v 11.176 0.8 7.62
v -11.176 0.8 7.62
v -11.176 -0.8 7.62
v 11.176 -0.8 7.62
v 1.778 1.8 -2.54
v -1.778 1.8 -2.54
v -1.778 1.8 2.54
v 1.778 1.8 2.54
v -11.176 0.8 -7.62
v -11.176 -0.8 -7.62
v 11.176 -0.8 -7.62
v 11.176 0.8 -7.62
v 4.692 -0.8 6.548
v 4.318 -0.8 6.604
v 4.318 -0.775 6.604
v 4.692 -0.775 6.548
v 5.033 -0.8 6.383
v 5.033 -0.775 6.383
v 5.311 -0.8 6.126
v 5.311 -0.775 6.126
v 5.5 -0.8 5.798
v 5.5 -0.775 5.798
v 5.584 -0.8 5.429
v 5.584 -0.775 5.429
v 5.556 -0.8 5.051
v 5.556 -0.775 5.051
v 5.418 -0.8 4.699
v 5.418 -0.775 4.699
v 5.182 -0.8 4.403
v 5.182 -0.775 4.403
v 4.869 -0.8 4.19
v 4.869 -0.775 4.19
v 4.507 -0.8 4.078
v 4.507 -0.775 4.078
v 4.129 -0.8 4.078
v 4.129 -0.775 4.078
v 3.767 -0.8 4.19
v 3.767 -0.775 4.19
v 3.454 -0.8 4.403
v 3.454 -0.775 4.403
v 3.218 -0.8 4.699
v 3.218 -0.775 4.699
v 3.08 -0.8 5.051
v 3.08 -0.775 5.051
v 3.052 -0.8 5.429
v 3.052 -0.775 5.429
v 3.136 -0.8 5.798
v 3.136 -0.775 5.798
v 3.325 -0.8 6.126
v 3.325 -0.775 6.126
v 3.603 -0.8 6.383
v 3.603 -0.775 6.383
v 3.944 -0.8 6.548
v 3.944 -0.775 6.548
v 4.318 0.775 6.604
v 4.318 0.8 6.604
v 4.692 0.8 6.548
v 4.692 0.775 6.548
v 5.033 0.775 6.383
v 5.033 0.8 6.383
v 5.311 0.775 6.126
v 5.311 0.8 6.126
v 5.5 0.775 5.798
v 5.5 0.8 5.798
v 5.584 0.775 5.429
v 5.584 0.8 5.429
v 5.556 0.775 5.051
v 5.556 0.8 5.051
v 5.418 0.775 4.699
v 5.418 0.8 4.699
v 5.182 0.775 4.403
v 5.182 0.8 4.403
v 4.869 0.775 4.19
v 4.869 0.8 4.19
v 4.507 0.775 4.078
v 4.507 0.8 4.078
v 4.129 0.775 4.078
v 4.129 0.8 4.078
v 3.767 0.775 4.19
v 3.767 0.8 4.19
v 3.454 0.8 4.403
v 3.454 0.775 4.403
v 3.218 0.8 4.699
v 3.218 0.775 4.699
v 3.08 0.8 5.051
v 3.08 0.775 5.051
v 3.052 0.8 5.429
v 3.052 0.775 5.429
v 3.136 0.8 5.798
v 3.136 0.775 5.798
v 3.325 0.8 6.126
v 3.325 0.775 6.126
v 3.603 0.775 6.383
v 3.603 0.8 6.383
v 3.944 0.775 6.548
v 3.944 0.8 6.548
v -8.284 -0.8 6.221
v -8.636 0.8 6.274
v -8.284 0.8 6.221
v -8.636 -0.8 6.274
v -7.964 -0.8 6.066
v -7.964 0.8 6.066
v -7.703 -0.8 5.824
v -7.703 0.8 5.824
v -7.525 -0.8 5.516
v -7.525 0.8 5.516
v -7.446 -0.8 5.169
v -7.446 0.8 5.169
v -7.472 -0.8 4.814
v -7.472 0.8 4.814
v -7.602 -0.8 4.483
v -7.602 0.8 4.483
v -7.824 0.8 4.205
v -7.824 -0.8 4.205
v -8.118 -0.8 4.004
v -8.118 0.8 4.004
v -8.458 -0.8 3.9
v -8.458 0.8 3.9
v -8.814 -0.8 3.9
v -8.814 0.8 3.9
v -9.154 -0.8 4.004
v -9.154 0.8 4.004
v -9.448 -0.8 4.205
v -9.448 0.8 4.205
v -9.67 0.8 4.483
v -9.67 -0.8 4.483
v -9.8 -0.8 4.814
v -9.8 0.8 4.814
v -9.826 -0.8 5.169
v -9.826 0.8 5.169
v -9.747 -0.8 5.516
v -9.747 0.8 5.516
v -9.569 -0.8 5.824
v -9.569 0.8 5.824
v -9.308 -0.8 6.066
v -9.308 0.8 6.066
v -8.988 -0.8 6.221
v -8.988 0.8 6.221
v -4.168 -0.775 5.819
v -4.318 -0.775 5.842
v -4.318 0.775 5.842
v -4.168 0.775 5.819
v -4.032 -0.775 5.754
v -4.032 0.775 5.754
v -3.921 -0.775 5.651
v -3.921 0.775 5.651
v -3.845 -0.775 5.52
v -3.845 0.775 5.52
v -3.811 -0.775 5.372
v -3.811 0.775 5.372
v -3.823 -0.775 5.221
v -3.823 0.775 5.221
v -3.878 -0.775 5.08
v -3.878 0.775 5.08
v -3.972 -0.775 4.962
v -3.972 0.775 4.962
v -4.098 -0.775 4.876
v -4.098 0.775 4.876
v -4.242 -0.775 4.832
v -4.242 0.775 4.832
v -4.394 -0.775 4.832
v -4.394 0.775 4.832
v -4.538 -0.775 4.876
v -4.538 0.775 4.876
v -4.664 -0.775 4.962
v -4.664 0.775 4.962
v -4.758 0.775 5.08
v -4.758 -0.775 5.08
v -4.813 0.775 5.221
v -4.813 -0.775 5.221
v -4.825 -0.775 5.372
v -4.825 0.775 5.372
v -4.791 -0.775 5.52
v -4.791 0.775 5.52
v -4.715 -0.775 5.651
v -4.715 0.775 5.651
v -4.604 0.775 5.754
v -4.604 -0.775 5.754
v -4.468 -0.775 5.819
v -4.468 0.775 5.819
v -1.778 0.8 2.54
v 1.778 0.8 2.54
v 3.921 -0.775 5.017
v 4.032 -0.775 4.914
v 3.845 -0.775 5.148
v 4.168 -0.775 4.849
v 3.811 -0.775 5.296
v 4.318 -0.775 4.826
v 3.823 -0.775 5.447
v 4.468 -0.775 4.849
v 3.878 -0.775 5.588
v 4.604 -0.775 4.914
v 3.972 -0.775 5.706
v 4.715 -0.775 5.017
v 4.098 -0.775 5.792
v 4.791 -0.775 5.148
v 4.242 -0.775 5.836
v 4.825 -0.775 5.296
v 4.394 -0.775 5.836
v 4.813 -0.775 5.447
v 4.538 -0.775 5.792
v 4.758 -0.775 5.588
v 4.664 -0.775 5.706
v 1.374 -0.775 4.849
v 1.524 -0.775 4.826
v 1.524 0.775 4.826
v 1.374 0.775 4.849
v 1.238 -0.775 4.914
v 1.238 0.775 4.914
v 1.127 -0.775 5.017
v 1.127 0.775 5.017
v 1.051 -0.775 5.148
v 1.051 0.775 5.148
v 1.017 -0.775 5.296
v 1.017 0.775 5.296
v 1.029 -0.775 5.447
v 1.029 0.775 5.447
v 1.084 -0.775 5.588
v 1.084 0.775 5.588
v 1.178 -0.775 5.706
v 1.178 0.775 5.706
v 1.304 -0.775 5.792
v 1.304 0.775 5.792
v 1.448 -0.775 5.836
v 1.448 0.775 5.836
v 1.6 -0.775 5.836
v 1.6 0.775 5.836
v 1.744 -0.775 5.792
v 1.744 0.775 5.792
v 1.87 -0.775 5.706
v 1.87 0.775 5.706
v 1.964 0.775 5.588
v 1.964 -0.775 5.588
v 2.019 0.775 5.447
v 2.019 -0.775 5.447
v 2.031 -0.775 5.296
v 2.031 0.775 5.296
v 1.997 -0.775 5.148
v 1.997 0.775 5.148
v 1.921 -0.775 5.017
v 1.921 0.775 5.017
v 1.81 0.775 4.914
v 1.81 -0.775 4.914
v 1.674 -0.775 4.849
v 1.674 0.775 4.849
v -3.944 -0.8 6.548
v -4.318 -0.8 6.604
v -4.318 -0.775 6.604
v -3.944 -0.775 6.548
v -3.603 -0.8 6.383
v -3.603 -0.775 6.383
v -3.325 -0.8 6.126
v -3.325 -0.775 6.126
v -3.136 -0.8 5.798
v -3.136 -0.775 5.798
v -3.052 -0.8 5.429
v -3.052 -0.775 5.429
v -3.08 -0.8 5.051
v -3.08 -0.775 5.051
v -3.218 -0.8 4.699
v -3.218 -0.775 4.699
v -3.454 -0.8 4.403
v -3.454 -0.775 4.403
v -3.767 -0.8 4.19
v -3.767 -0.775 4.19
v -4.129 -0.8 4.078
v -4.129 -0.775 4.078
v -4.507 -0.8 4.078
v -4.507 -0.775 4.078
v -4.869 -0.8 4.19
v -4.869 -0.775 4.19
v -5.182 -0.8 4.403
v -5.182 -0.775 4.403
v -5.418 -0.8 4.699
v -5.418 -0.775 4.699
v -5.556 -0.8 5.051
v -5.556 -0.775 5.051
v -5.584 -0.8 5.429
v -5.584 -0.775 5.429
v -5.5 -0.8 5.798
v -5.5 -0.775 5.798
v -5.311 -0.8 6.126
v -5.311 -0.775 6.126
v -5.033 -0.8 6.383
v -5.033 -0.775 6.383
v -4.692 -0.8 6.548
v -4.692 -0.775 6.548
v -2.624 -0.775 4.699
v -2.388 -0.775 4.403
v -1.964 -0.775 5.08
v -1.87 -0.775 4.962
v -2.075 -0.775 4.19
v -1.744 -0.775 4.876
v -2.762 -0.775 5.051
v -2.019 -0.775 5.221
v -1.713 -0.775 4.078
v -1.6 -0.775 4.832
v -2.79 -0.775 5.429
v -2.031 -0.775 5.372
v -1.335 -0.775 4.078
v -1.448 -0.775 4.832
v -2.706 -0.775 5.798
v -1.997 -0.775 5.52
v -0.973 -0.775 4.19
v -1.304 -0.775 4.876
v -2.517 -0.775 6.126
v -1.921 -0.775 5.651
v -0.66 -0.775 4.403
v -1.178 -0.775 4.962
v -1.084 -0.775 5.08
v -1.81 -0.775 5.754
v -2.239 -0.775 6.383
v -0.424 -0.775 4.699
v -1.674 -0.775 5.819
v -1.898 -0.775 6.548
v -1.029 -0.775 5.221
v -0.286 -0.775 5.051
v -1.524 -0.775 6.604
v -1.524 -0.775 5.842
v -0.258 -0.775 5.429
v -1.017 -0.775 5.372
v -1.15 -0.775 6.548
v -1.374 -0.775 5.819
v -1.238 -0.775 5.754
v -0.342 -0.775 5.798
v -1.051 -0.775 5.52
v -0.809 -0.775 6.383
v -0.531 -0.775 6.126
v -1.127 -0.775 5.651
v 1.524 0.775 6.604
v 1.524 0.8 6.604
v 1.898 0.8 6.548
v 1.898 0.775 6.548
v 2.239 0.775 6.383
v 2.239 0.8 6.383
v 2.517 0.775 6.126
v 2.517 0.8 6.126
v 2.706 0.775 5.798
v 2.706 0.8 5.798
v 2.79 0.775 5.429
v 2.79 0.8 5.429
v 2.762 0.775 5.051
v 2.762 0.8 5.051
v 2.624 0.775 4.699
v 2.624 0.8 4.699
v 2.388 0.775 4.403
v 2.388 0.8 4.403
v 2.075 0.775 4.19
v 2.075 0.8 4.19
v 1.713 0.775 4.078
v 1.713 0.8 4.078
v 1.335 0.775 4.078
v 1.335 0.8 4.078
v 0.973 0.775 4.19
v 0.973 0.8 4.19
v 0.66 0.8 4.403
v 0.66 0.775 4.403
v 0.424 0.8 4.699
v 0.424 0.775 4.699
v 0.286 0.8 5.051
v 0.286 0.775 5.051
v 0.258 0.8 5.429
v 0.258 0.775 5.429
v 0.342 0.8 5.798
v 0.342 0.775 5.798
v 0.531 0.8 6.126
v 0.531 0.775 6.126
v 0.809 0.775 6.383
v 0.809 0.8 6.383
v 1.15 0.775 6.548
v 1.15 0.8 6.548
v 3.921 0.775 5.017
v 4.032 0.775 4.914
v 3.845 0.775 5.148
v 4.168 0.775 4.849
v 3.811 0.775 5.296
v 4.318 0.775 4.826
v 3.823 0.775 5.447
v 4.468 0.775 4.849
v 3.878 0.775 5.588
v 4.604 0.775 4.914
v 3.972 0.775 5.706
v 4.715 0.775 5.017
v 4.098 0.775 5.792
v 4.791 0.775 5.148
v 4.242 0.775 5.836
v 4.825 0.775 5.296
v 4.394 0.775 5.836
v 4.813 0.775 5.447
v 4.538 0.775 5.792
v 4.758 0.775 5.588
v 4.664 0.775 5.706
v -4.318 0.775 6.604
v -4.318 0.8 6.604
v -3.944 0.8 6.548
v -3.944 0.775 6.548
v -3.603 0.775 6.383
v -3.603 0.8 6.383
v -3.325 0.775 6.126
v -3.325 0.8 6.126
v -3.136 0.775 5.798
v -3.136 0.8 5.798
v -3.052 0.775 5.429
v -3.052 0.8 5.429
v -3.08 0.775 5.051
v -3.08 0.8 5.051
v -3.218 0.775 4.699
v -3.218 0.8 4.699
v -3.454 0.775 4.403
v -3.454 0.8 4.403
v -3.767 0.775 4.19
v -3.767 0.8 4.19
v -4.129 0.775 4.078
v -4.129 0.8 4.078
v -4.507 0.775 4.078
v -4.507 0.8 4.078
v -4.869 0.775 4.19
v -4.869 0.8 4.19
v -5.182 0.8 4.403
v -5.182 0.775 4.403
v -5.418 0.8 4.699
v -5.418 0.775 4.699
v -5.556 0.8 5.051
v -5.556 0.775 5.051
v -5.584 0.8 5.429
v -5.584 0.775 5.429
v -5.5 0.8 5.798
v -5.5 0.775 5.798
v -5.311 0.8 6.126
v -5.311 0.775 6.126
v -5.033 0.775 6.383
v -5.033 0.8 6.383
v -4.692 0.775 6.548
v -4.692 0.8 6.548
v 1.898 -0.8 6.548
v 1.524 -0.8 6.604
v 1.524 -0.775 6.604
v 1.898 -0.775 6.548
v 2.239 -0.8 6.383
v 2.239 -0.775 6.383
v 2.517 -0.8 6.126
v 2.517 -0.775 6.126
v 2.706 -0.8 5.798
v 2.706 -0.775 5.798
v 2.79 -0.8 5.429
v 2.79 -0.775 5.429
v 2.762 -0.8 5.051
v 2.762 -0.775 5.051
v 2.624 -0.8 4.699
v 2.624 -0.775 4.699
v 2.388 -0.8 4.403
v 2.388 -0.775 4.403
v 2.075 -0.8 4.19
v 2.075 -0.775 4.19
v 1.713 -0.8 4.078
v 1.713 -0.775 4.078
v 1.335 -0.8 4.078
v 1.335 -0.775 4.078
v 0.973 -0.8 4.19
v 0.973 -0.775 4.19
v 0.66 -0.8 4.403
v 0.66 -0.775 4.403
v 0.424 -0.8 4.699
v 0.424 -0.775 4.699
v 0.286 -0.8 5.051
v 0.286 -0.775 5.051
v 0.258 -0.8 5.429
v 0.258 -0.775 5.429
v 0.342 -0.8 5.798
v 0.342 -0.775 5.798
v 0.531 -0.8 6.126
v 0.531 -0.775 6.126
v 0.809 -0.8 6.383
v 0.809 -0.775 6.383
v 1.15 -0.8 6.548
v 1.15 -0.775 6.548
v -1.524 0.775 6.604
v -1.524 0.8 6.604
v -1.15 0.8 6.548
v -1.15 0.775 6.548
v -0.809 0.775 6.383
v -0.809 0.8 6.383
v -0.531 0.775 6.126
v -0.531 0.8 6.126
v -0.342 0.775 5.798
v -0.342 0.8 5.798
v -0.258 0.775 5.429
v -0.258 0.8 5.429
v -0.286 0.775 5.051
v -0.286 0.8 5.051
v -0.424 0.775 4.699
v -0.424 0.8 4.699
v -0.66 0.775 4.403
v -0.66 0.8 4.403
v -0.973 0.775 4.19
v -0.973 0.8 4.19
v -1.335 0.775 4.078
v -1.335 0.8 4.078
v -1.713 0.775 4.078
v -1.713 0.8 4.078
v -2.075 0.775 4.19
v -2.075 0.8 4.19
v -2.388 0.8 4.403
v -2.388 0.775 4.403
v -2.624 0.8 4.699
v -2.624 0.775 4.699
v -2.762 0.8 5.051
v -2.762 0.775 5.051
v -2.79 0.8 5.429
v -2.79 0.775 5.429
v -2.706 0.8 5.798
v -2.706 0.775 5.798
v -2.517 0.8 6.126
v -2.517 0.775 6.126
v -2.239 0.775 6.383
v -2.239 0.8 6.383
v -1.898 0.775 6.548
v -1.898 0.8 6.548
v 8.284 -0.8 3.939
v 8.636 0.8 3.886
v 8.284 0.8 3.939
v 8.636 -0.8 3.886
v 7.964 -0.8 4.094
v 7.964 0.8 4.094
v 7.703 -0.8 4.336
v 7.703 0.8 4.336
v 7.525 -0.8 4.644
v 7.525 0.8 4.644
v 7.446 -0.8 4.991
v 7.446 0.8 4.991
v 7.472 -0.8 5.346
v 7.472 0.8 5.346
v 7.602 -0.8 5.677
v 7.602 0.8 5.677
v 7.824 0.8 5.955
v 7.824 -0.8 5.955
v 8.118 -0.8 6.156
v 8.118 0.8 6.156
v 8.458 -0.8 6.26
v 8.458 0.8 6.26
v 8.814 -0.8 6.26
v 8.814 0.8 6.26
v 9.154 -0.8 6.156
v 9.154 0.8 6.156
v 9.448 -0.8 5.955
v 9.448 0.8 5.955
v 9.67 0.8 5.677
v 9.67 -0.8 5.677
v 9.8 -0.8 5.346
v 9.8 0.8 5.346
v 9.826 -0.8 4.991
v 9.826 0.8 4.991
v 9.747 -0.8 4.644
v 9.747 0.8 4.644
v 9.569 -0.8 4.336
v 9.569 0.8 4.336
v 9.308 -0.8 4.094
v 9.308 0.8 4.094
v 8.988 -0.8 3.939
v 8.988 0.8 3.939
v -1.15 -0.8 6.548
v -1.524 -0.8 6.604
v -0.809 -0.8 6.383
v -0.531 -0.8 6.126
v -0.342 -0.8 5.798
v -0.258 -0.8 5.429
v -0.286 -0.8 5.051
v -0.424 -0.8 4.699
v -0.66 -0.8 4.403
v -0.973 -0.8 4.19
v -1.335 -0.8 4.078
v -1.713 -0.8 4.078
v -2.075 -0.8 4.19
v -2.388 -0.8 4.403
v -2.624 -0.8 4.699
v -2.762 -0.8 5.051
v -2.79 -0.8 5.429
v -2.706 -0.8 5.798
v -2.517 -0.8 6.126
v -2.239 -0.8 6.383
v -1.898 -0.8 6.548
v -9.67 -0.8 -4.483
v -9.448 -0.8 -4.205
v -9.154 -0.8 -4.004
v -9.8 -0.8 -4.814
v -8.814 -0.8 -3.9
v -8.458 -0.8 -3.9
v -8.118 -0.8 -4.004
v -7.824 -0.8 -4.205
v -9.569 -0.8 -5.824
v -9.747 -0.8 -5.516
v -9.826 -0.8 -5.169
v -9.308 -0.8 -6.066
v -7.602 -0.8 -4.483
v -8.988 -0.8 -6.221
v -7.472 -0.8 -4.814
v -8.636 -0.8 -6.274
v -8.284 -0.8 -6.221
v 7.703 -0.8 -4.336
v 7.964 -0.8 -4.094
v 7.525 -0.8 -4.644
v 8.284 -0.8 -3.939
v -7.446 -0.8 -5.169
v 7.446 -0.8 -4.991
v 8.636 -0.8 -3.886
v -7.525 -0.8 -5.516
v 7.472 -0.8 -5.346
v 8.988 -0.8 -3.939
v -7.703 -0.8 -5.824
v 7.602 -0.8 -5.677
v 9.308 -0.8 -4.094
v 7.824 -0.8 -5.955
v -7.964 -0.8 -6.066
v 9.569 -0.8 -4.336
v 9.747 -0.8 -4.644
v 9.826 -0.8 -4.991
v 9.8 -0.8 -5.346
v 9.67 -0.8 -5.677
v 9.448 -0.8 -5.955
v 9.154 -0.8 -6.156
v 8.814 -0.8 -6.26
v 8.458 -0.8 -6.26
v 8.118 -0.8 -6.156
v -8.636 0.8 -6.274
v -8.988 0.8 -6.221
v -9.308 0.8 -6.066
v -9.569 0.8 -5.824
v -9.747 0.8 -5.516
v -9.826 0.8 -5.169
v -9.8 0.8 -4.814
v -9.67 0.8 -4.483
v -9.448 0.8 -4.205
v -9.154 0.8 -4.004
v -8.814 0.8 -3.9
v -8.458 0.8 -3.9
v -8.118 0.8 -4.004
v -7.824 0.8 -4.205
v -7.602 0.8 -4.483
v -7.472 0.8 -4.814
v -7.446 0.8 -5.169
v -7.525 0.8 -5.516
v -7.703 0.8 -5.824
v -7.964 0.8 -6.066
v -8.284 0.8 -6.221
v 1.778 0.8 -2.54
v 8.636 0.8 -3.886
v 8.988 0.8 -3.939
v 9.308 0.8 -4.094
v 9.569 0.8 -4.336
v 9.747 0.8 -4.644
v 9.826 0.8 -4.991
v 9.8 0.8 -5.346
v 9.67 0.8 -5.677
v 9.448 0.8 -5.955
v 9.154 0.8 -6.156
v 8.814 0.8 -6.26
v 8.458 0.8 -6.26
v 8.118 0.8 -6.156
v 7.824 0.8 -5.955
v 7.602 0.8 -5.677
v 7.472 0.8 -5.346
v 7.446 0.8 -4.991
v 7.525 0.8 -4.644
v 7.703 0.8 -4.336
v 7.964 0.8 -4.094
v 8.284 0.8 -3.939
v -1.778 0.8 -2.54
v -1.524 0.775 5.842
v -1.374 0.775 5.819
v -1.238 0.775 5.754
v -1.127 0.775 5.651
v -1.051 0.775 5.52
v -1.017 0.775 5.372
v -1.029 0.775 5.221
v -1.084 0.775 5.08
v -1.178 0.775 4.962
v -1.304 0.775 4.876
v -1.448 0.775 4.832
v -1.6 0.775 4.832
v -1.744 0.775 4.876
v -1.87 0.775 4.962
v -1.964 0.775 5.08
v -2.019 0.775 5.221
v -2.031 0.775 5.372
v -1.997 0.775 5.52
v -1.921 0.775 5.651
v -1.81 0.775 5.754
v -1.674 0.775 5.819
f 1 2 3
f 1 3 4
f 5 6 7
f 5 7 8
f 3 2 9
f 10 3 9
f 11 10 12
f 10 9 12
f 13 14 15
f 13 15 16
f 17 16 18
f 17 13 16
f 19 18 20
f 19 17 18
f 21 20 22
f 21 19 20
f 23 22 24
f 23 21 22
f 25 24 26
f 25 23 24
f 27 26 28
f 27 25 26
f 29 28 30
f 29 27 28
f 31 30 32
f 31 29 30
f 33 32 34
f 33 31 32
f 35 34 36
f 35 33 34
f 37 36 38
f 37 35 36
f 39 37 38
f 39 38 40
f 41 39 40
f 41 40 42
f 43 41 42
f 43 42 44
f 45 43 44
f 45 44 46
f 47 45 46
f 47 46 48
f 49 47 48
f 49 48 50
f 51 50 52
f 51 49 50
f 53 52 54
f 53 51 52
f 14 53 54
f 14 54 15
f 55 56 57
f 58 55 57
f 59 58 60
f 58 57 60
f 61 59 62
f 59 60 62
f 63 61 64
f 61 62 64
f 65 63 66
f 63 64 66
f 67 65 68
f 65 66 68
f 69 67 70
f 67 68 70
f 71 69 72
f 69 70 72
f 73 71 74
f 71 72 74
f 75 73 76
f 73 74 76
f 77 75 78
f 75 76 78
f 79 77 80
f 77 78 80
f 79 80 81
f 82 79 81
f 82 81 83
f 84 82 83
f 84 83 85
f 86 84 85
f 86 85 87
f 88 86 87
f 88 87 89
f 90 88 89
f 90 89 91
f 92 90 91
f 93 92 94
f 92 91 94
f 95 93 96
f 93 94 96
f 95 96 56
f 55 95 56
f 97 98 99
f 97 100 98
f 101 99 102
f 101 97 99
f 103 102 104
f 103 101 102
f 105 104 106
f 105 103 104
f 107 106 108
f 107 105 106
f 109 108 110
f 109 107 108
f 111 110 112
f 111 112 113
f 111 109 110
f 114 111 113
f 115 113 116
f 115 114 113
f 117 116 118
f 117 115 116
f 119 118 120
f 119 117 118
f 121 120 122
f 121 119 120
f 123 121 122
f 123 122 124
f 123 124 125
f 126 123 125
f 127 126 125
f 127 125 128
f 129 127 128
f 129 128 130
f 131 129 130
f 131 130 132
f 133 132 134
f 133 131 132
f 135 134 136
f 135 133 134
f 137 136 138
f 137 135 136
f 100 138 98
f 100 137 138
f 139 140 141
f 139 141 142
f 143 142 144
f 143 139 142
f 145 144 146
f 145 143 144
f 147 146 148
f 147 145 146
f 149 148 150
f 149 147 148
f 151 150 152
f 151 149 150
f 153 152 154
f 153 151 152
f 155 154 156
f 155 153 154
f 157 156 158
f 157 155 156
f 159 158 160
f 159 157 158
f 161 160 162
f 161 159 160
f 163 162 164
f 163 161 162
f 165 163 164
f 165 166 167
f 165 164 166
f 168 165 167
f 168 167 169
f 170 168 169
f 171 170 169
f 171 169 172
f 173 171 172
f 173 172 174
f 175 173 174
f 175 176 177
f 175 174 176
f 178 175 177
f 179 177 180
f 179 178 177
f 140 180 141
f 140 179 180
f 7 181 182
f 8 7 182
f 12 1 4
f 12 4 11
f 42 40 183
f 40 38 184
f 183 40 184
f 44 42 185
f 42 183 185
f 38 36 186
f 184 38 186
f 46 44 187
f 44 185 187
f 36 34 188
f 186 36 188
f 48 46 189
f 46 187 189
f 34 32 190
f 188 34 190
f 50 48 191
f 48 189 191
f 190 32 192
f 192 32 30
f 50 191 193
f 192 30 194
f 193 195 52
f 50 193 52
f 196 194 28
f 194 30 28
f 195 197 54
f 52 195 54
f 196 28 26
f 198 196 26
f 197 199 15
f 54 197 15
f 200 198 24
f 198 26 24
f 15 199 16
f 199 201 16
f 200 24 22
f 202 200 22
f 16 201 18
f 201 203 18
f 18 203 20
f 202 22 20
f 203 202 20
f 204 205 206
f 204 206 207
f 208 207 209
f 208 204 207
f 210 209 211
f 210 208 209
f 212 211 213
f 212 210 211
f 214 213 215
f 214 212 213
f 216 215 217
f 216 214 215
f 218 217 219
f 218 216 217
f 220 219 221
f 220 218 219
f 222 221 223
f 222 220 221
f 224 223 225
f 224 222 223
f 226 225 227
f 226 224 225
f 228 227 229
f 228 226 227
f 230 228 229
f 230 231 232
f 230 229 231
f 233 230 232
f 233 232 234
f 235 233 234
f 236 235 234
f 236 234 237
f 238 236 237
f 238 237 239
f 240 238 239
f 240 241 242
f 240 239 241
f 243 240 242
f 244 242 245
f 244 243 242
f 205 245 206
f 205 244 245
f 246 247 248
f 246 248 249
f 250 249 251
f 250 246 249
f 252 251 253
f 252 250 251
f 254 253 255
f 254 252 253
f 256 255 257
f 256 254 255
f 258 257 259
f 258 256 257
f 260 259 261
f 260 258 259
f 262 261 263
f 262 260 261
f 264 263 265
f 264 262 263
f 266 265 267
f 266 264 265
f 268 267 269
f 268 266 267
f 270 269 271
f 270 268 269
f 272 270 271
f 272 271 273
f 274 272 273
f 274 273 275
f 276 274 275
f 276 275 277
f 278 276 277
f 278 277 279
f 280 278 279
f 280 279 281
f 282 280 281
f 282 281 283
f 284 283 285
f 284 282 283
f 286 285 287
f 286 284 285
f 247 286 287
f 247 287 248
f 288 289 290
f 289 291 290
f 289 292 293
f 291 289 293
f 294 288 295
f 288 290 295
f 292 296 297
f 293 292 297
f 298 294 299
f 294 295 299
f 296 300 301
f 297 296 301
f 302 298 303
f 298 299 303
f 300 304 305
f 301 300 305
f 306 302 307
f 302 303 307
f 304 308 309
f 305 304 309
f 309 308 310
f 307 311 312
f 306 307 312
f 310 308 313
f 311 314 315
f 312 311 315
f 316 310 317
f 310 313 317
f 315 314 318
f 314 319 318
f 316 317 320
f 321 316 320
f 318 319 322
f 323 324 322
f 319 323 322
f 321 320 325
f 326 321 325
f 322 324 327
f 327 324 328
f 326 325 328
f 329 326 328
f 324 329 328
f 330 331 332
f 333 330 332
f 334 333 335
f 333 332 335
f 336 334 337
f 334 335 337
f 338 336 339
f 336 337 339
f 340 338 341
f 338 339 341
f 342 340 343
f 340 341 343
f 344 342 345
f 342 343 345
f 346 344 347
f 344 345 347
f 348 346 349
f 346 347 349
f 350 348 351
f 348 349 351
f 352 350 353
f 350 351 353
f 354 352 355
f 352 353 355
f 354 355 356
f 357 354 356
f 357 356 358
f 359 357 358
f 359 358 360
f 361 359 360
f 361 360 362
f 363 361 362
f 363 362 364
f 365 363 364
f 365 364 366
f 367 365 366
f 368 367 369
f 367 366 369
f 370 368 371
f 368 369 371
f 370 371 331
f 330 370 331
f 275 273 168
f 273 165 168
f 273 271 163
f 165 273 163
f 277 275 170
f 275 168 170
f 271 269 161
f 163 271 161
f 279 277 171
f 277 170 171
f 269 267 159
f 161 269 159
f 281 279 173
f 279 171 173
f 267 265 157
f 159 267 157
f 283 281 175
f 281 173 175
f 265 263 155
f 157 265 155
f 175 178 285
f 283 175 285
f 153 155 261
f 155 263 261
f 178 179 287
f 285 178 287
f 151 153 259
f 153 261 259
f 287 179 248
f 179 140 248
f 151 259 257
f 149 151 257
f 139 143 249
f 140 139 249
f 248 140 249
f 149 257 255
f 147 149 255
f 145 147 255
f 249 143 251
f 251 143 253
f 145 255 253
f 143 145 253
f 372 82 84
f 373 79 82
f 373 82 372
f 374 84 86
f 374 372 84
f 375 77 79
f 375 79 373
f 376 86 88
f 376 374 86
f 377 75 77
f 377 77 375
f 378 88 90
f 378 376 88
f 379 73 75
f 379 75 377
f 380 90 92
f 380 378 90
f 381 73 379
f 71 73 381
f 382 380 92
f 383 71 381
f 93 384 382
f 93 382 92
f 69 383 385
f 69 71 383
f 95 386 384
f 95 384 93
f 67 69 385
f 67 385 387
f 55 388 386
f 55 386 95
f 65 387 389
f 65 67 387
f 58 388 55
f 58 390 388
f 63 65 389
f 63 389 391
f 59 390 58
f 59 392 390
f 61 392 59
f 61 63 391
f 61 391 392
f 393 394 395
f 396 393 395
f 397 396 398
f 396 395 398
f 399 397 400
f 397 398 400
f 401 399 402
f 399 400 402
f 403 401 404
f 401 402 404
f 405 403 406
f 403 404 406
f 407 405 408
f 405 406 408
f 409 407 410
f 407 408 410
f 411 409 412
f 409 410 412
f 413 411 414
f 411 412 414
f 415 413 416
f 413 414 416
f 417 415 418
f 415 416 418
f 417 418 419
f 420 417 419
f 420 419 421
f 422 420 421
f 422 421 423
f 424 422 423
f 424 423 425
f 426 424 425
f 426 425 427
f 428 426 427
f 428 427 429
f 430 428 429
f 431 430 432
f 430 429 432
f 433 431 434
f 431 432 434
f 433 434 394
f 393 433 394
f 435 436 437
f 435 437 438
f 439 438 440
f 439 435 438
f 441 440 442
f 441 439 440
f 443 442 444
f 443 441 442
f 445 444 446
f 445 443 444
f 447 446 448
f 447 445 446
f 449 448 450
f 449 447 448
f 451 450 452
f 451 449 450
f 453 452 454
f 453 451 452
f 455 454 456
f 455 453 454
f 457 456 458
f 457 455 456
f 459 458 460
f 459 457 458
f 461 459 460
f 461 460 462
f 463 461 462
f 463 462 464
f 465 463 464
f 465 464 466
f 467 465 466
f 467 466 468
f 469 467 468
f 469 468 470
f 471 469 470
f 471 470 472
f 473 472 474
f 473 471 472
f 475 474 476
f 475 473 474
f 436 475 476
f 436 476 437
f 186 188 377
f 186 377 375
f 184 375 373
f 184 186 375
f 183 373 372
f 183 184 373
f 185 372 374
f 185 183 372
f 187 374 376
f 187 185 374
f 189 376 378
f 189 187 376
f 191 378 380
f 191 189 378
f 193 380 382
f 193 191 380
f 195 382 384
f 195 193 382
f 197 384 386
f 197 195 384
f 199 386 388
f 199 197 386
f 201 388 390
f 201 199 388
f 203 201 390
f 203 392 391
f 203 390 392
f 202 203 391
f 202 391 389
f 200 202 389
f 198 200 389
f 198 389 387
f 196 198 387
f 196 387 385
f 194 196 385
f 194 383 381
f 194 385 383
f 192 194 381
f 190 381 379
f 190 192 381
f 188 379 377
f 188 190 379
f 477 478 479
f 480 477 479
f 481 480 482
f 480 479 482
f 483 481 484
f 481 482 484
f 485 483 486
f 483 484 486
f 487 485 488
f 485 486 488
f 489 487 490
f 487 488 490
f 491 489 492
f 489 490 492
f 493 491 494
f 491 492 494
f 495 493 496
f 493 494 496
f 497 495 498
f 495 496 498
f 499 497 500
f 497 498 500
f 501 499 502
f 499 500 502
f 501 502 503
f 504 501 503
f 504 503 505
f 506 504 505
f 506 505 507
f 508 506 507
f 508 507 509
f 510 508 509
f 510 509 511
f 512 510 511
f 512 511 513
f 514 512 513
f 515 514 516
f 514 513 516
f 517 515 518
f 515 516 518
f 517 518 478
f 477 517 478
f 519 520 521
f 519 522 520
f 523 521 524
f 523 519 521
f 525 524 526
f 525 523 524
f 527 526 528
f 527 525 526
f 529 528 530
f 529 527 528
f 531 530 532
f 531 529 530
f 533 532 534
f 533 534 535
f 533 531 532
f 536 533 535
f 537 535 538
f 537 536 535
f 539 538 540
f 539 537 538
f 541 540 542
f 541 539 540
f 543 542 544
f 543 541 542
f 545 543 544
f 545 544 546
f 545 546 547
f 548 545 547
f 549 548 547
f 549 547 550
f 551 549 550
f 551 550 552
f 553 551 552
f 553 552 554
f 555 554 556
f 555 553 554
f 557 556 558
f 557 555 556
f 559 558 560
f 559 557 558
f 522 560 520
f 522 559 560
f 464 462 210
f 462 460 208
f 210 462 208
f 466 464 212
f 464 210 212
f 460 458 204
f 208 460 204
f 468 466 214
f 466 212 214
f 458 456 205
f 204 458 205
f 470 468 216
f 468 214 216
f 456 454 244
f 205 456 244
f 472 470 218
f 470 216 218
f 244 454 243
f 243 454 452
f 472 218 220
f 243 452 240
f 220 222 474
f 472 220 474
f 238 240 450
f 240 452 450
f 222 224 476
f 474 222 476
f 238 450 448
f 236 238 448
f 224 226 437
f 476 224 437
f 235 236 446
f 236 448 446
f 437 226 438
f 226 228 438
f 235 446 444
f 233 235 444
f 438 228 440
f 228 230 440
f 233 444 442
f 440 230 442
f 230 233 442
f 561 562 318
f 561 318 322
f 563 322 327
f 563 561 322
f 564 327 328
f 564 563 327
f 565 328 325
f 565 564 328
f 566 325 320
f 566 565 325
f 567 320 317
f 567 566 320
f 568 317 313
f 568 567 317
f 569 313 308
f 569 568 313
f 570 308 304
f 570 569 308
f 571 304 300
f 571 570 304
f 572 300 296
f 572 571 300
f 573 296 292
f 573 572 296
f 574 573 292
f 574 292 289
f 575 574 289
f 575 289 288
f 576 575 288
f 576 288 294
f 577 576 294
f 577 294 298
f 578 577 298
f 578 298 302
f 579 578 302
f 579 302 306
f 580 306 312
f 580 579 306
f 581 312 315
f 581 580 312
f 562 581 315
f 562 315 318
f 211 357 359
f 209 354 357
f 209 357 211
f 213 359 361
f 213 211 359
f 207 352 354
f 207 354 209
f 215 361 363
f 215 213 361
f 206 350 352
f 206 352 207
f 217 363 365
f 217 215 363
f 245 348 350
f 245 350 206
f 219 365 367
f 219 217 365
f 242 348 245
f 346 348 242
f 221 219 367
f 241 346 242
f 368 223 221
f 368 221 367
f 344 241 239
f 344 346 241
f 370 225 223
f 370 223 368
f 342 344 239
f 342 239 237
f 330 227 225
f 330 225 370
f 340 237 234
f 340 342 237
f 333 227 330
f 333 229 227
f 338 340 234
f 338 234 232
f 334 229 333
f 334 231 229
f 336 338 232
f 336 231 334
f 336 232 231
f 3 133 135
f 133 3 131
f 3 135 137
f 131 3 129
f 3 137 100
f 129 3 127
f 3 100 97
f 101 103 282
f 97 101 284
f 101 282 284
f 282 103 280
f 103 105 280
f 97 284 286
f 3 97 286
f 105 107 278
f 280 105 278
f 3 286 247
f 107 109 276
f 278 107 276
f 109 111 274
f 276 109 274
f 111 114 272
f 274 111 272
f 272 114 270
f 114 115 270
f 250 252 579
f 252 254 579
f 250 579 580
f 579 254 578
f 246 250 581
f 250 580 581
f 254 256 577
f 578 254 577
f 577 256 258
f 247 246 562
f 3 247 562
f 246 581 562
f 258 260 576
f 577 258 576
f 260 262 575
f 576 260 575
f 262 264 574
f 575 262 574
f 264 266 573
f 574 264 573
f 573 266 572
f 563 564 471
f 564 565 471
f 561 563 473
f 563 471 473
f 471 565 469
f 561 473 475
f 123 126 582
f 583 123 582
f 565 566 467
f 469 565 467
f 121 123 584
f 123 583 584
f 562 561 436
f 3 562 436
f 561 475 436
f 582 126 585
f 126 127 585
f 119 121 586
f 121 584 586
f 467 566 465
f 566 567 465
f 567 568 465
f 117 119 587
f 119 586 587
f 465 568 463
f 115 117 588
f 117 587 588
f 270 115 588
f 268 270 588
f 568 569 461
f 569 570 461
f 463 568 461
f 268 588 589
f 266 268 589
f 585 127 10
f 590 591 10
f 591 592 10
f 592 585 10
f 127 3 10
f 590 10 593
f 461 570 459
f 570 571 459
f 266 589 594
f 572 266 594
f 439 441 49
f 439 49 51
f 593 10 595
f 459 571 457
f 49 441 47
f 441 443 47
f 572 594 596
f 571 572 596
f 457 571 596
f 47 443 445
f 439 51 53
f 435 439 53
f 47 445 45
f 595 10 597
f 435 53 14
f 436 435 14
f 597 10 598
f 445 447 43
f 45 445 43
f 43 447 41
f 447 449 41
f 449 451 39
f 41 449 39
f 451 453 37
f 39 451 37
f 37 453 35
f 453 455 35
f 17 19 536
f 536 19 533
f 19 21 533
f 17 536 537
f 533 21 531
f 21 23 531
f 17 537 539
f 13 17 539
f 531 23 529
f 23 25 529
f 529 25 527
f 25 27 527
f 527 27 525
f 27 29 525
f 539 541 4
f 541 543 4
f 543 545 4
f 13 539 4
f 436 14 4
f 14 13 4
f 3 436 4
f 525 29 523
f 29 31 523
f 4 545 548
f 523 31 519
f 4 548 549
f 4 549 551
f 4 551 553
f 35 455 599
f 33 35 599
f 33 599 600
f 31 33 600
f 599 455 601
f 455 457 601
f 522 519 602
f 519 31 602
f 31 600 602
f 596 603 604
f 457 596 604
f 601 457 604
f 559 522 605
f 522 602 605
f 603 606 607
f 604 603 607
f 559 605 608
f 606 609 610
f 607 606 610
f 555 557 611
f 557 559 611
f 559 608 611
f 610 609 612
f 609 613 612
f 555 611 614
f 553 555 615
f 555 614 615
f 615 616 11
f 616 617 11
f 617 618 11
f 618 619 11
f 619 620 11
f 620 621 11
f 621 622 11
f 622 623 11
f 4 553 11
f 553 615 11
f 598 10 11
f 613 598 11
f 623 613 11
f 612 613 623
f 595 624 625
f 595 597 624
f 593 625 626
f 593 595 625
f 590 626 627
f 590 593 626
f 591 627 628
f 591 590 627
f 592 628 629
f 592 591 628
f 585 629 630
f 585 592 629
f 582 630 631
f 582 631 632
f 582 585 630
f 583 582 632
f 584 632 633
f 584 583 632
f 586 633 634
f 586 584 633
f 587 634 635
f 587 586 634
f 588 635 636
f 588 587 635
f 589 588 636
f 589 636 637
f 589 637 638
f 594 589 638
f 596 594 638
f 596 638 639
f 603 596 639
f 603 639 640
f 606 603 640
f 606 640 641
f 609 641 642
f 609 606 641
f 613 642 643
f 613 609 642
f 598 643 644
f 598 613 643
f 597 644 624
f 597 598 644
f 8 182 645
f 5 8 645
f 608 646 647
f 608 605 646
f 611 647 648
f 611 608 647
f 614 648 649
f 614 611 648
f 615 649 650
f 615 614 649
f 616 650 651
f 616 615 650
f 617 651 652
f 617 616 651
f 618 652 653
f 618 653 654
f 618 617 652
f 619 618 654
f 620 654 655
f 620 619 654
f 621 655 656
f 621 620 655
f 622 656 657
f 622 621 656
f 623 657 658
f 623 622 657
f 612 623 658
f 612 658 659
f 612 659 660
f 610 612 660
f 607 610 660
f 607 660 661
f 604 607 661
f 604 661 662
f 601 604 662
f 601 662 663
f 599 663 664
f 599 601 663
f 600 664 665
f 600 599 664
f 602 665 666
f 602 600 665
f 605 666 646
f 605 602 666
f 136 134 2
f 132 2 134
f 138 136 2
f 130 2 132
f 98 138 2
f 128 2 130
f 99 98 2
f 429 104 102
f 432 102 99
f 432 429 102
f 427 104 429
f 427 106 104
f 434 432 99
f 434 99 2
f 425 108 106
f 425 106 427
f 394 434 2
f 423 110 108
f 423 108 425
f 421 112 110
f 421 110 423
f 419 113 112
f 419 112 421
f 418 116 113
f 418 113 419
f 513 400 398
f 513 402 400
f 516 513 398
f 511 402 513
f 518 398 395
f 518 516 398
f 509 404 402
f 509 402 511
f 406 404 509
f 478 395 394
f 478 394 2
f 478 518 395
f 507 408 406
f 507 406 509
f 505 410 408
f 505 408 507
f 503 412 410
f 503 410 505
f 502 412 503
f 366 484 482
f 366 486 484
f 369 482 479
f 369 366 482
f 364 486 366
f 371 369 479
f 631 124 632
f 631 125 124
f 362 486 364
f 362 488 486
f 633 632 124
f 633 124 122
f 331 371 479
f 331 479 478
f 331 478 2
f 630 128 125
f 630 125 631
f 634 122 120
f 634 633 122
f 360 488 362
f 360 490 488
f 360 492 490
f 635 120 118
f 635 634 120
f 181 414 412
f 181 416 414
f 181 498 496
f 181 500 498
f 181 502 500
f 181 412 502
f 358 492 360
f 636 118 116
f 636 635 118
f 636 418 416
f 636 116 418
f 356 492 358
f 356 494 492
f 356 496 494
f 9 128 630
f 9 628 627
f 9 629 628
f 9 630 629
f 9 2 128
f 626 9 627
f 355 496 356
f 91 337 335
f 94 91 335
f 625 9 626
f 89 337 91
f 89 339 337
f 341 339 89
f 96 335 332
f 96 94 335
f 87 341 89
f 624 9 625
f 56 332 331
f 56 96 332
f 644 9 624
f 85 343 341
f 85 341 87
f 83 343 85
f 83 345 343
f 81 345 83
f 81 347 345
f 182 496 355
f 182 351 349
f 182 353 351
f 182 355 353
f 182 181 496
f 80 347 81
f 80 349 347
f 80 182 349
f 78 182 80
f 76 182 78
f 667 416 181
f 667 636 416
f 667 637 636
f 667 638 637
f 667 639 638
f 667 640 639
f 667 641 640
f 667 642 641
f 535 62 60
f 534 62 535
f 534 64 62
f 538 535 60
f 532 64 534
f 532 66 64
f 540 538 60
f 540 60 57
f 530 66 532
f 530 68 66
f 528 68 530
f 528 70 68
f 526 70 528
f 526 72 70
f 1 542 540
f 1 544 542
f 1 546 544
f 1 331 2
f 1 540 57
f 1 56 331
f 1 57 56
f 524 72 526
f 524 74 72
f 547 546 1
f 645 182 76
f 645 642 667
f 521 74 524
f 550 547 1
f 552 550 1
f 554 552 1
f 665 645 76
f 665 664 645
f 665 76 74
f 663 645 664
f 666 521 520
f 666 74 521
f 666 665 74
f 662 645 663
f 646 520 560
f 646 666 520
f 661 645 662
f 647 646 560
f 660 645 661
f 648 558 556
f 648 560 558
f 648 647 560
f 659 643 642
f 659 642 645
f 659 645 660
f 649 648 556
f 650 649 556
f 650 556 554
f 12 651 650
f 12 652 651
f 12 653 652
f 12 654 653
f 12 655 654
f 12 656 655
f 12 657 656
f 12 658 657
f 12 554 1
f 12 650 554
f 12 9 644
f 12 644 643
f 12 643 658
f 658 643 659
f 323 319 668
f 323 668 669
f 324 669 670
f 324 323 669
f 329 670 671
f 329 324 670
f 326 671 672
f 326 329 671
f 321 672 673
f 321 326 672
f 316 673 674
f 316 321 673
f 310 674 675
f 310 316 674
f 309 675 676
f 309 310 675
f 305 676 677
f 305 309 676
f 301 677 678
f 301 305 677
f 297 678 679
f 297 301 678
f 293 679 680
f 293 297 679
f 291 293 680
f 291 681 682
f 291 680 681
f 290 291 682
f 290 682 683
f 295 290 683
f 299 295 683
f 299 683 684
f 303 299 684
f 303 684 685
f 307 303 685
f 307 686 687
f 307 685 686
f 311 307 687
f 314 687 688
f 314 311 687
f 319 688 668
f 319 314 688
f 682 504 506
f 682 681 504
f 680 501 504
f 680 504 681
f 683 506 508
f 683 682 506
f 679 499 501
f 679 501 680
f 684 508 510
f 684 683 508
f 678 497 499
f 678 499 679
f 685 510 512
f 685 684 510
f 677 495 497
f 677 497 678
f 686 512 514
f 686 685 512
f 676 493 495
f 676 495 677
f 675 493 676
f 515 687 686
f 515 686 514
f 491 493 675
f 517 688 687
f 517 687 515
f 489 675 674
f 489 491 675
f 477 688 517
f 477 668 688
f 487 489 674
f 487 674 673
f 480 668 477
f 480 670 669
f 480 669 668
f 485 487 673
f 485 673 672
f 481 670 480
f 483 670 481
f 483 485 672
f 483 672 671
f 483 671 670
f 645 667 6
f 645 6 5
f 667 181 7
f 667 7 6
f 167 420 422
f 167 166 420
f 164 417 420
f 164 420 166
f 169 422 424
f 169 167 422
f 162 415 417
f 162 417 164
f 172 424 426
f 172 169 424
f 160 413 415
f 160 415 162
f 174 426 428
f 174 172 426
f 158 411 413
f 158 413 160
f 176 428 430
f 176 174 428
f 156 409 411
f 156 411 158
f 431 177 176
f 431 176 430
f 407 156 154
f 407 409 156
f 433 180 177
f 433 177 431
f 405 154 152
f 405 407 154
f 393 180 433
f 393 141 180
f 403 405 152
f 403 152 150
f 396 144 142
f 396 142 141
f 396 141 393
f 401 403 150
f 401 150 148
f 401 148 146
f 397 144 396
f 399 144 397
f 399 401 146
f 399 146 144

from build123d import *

# Parameters (mm, degrees)
SKETCH1_W               = 22.352
SKETCH1_H               = 15.24
SKETCH1_R               = 1.1938
BOSS_EXTRUDE1_DEPTH     = 0.8
SKETCH2_W               = 3.556
SKETCH2_H               = 5.08
BOSS_EXTRUDE2_DEPTH     = 1
CUT_EXTRUDE1_DEPTH      = 14.620843439
CUT_EXTRUDE1_DEPTH_BACK = 14.620843439
SKETCH3_R               = 0.508
SKETCH4_R               = 1.27
CUT_EXTRUDE2_DEPTH      = 0.0254


with BuildPart() as part:
    # Sketch1 → Boss-Extrude1 (new, symmetric)
    with BuildSketch(Plane(origin=(0, 0, 0), x_dir=(1, 0, 0), z_dir=(0, 1, 0))):
        Rectangle(SKETCH1_W, SKETCH1_H)
        with Locations((8.636, 5.08)):
            Circle(SKETCH1_R, mode=Mode.SUBTRACT)
        with Locations((8.636, -5.08)):
            Circle(SKETCH1_R, mode=Mode.SUBTRACT)
        with Locations((-8.636, -5.08)):
            Circle(SKETCH1_R, mode=Mode.SUBTRACT)
        with Locations((-8.636, 5.08)):
            Circle(SKETCH1_R, mode=Mode.SUBTRACT)
    extrude(amount=BOSS_EXTRUDE1_DEPTH, both=True)

    # Sketch2 → Boss-Extrude2 (add)
    with BuildSketch(Plane(origin=(0, 0.8, 0), x_dir=(1, 0, 0), z_dir=(0, 1, 0))):
        Rectangle(SKETCH2_W, SKETCH2_H)
    extrude(amount=BOSS_EXTRUDE2_DEPTH)

    # Sketch3 → Cut-Extrude1 (cut, two sides: drawn at the far end of the back side and taken through both)
    with BuildSketch(Plane(origin=(0, 0.8, 0), x_dir=(1, 0, 0), z_dir=(0, 1, 0)).offset(-CUT_EXTRUDE1_DEPTH_BACK)):
        with Locations((-1.524, -5.334)):
            Circle(SKETCH3_R)
        with Locations((-4.318, -5.334)):
            Circle(SKETCH3_R)
        with Locations((4.318, -5.334)):
            Circle(SKETCH3_R)
        with Locations((1.524, -5.334)):
            Circle(SKETCH3_R)
    extrude(amount=CUT_EXTRUDE1_DEPTH + CUT_EXTRUDE1_DEPTH_BACK, mode=Mode.SUBTRACT)

    # Sketch4 → Cut-Extrude2 (cut)
    with BuildSketch(Plane(origin=(0, 0.8, 0), x_dir=(1, 0, 0), z_dir=(0, 1, 0))):
        with Locations((-4.318, -5.334)):
            Circle(SKETCH4_R)
        with Locations((-1.524, -5.334)):
            Circle(SKETCH4_R)
        with Locations((1.524, -5.334)):
            Circle(SKETCH4_R)
        with Locations((4.318, -5.334)):
            Circle(SKETCH4_R)
    cut_extrude2 = extrude(amount=-CUT_EXTRUDE2_DEPTH, mode=Mode.SUBTRACT)

    # Mirror1: Cut-Extrude2 across plane
    add(cut_extrude2.mirror(Plane.ZX), mode=Mode.SUBTRACT)


solid = part.part
